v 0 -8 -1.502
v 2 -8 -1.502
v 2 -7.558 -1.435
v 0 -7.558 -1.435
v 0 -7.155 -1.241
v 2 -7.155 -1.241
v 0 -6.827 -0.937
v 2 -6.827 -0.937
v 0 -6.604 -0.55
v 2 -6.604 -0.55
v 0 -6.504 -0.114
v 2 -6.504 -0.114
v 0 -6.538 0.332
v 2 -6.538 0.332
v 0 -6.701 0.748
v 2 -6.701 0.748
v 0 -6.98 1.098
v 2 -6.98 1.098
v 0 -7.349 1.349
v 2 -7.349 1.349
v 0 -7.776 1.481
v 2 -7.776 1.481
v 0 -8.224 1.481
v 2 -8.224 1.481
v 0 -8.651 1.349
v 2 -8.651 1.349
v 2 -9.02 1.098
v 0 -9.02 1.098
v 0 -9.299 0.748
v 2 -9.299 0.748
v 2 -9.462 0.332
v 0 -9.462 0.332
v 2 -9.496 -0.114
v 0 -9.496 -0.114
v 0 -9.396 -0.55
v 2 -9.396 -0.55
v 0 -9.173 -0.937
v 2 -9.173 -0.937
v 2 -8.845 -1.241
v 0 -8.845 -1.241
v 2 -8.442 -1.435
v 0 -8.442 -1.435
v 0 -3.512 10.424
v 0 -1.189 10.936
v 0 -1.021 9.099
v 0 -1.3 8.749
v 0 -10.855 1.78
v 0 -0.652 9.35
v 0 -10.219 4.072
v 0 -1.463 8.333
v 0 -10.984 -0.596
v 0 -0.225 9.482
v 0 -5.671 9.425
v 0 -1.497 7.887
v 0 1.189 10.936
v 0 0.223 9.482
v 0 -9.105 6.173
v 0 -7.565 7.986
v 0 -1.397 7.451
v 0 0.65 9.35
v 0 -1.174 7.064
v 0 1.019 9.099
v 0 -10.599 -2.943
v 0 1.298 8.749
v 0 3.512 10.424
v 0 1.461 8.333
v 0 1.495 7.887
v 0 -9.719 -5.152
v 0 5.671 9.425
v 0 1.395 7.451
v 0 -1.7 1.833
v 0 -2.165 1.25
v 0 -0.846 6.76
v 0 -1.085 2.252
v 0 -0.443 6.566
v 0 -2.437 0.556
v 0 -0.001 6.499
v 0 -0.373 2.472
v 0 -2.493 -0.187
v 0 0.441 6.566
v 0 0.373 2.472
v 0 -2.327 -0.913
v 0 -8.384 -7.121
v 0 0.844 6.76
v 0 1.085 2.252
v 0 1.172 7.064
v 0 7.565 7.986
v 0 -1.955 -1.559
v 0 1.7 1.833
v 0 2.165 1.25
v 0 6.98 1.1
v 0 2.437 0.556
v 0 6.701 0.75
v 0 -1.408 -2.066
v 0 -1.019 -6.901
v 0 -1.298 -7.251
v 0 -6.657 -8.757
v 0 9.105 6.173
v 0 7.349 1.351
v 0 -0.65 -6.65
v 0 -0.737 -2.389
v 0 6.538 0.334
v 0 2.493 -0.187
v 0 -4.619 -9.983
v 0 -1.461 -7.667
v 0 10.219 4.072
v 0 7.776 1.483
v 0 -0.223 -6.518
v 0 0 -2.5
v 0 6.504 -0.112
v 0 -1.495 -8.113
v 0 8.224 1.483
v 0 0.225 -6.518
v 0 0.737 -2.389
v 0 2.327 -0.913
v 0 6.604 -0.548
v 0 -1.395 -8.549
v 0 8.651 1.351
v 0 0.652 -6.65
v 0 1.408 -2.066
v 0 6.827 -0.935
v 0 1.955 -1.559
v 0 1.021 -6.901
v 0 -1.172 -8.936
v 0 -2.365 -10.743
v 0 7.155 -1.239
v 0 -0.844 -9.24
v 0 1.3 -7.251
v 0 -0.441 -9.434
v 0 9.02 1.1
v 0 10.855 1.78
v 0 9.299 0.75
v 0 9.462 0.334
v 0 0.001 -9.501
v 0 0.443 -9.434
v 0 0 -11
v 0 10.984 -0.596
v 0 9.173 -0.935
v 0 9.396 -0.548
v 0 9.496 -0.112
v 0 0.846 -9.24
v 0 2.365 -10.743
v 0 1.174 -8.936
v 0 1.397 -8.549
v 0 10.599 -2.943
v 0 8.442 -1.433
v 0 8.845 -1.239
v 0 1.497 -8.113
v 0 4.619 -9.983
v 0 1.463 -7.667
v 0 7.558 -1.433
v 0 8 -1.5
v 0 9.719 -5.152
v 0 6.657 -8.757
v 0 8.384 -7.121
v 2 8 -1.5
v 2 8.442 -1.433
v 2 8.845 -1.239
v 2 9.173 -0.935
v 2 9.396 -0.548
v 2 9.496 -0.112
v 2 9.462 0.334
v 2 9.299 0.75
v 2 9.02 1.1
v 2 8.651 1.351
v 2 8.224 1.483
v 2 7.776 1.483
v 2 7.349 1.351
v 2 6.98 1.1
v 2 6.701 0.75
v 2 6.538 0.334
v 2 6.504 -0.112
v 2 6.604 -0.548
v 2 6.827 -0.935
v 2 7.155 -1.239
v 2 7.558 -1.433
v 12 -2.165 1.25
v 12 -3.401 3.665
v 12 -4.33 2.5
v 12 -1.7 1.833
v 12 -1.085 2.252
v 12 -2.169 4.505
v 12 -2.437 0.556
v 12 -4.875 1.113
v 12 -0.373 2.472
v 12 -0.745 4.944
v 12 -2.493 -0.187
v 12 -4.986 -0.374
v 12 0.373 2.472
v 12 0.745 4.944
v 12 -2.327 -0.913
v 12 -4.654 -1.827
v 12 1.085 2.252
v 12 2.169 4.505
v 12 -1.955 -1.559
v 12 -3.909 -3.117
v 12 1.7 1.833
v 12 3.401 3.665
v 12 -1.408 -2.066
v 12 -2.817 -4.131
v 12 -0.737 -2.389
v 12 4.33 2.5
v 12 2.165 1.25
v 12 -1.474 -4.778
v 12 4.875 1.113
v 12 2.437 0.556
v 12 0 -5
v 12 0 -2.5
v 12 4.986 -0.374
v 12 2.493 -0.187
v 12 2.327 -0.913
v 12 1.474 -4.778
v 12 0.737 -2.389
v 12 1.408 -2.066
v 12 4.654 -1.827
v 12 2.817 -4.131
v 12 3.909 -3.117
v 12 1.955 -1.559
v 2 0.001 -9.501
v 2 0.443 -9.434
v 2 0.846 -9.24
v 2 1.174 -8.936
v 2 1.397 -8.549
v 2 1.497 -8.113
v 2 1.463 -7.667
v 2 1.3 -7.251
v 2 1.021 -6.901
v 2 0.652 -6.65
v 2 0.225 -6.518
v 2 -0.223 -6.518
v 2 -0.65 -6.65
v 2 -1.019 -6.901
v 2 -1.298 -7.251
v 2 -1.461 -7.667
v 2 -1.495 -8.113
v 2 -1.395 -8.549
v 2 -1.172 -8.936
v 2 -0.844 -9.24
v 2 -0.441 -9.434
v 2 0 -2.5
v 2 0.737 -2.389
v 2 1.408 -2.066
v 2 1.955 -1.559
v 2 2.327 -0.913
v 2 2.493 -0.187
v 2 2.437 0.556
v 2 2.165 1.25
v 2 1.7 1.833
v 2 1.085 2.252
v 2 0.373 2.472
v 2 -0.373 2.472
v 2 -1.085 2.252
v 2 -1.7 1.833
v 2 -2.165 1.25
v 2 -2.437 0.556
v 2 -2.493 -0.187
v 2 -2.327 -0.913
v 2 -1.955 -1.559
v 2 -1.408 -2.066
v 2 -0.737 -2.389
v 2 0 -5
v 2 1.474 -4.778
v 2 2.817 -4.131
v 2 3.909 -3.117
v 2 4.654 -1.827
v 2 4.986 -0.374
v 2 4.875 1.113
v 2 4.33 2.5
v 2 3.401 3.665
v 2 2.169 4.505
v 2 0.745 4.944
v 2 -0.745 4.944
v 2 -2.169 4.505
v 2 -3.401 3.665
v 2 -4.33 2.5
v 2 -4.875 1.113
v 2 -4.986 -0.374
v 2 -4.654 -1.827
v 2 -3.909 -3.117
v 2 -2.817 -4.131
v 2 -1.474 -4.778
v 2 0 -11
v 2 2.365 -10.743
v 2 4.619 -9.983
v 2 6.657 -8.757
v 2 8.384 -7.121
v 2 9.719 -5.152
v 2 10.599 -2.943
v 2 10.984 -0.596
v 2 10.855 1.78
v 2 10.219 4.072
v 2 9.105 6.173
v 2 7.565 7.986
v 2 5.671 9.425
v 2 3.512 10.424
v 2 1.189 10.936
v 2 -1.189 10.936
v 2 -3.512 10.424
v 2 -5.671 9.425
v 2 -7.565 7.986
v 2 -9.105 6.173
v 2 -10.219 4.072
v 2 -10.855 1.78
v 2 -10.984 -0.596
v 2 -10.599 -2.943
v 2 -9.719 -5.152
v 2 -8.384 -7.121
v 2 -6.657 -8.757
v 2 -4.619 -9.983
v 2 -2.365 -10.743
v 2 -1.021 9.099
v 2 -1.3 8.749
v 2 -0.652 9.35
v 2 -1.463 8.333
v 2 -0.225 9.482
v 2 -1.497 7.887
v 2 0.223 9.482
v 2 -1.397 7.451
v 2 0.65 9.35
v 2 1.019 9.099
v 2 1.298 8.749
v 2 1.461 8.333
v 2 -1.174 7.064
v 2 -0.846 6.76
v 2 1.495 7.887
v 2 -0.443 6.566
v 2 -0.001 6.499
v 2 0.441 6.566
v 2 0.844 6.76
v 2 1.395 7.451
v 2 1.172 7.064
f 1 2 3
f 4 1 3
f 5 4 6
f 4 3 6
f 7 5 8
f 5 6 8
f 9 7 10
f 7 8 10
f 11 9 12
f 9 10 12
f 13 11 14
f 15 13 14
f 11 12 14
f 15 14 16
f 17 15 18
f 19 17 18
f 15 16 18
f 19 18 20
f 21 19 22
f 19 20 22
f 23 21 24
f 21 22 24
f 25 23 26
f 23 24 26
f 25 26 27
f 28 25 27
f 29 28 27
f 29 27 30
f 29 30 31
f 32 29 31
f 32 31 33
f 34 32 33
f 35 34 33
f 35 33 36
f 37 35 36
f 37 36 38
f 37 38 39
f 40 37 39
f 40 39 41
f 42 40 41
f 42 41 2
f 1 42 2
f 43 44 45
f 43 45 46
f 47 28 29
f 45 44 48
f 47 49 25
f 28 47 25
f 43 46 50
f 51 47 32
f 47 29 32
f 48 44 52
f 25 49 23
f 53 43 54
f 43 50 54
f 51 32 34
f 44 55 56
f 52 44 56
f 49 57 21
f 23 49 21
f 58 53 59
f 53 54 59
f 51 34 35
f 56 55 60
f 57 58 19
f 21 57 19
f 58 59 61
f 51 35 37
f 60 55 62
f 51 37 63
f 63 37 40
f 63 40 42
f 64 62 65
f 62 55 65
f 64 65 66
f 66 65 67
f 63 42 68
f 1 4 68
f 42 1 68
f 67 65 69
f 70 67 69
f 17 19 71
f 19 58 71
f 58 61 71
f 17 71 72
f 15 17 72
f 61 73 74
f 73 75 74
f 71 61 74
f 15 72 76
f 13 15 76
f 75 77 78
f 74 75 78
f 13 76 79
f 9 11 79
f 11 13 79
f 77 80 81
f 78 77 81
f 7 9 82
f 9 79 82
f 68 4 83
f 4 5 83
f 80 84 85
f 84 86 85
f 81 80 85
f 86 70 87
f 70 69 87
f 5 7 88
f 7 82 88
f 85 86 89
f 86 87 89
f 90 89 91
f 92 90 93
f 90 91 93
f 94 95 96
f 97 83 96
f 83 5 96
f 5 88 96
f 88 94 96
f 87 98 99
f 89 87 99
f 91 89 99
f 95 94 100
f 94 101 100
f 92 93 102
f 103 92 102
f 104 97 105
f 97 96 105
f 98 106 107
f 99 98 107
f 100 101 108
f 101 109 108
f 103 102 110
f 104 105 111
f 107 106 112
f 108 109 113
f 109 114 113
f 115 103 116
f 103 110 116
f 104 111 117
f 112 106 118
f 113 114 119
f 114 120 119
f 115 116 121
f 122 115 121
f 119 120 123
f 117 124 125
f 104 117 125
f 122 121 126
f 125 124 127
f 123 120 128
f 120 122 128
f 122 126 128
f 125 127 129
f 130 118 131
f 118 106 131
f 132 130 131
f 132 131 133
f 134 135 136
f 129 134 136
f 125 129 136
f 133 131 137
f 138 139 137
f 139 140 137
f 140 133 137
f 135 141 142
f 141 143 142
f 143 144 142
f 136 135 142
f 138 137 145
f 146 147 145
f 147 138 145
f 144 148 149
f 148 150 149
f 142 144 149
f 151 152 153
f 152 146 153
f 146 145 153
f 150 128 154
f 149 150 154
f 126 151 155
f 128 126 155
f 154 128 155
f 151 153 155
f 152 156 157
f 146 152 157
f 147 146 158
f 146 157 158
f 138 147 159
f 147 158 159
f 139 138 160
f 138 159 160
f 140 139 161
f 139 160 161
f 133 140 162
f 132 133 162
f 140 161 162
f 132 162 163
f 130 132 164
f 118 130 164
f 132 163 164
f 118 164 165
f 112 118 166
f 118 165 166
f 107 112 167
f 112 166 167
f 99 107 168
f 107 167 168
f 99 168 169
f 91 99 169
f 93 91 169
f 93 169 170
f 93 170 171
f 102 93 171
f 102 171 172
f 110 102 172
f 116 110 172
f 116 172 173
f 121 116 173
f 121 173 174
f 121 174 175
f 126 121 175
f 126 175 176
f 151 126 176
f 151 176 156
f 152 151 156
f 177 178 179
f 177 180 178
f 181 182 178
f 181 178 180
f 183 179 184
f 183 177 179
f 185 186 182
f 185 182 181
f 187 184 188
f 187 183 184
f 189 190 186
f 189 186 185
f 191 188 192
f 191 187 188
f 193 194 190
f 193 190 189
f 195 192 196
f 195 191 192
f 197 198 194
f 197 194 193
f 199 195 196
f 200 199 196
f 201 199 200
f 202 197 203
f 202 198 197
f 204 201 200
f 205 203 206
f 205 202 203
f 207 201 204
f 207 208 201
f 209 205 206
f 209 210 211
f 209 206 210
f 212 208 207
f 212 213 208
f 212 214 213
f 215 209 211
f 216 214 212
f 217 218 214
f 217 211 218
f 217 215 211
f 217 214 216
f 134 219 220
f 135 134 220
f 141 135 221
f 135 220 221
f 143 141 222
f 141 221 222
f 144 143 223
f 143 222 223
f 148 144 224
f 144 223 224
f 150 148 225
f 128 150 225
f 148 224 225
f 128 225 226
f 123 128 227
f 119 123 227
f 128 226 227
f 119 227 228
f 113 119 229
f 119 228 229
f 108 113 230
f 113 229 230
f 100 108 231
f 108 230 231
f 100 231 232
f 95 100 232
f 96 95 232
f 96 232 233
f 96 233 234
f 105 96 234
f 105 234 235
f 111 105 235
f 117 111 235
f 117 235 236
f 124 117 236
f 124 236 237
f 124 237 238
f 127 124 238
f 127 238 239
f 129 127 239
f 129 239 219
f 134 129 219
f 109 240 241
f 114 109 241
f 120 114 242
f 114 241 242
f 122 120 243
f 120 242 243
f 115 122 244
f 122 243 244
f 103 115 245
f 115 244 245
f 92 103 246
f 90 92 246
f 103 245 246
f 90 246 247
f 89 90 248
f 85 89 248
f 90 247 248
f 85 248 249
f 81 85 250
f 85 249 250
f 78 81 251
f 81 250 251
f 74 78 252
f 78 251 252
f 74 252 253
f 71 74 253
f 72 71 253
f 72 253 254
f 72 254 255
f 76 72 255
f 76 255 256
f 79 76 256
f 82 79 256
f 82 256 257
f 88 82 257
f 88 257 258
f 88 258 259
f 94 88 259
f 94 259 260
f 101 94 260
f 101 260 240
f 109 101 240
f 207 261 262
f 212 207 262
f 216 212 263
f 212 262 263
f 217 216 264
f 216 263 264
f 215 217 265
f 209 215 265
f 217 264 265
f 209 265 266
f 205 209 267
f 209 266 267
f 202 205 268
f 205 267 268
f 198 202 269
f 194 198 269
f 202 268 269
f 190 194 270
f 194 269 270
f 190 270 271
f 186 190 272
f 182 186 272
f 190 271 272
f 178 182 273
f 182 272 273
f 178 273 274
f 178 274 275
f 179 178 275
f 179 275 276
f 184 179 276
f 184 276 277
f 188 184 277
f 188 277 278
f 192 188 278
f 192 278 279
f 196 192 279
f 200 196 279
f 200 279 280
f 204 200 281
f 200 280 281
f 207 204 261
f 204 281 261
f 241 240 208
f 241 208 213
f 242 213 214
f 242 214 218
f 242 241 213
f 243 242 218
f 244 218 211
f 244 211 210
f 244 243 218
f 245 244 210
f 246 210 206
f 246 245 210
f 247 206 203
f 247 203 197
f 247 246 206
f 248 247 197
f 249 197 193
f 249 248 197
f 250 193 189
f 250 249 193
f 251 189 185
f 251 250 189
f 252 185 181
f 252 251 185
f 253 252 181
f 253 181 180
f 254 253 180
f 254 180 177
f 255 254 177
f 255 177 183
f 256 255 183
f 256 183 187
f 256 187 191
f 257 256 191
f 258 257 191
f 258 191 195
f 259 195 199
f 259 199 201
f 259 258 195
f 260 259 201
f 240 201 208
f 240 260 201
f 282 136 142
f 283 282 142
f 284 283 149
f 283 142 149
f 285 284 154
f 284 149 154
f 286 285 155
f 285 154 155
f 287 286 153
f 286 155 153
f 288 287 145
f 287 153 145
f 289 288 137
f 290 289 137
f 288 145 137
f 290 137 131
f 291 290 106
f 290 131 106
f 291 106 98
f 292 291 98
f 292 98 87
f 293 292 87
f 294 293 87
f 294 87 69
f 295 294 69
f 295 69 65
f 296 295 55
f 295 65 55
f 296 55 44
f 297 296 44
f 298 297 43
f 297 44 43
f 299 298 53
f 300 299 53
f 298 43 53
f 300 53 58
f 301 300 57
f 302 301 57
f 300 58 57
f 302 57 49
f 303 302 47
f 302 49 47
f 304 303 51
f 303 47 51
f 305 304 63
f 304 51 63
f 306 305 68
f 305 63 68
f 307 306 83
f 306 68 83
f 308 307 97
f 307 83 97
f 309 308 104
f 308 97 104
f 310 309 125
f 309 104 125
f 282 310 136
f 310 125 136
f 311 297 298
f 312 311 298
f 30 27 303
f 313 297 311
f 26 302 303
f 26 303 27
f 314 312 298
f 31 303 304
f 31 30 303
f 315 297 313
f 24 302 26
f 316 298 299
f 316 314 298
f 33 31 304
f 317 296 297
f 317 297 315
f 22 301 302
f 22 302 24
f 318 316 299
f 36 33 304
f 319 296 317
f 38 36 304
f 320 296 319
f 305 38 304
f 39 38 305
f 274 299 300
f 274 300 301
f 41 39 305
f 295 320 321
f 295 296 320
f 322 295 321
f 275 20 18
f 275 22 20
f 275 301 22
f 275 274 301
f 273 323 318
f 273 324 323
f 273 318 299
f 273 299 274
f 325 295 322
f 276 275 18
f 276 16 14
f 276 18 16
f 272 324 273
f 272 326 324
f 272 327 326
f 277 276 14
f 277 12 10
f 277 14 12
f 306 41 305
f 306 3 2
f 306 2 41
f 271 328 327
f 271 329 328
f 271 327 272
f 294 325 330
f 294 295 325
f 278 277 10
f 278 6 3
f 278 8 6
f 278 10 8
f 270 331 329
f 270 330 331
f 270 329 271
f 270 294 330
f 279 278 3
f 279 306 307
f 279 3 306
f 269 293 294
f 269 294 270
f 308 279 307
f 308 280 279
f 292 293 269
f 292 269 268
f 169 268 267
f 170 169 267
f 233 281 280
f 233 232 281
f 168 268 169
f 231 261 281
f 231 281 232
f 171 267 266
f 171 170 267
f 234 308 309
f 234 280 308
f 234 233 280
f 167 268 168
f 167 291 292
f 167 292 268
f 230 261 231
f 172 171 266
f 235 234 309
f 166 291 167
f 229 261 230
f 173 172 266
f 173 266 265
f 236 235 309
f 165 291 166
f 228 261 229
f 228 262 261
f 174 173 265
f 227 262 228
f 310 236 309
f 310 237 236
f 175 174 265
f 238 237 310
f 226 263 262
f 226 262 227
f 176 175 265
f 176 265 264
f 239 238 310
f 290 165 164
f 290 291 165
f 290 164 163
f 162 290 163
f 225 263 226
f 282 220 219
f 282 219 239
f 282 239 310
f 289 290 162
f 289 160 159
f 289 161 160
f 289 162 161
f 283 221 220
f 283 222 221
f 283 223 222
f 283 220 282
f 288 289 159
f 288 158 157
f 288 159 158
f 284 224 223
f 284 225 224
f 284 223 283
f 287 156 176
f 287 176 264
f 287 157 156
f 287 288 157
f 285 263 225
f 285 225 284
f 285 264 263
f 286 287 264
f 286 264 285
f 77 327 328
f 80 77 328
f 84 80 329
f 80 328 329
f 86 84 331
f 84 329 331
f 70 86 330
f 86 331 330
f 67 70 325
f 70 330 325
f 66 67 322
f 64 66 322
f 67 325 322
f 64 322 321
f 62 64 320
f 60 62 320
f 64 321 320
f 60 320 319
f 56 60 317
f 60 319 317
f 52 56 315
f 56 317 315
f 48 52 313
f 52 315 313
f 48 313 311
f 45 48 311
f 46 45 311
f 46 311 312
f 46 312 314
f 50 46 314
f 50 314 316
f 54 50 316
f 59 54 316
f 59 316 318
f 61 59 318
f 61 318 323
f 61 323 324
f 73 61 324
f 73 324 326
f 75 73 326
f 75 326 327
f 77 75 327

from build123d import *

# Parameters (mm, degrees)
SKETCH_1_R          = 11
EXTRUDE_1_DEPTH     = 2
SKETCH_2_R          = 5
SKETCH_2_R_2        = 2.5
EXTRUDE_2_DEPTH     = 10
SKETCH_3_R          = 1.5
CUT_EXTRUDE_1_DEPTH = 10
SKETCH_5_R          = 2.5
CUT_EXTRUDE_2_DEPTH = 19.493242009


with BuildPart() as part:
    # 草图1 → 凸台-拉伸1 (new body)
    with BuildSketch(Plane(origin=(0, 0, 0), x_dir=(0, 0, -1), z_dir=(1, 0, 0))):
        Circle(SKETCH_1_R)
    extrude(amount=EXTRUDE_1_DEPTH)

    # 草图2 → 凸台-拉伸2 (add)
    with BuildSketch(Plane(origin=(2, 0, 0), x_dir=(0, 0, -1), z_dir=(1, 0, 0))):
        Circle(SKETCH_2_R)
        Circle(SKETCH_2_R_2, mode=Mode.SUBTRACT)
    extrude(amount=EXTRUDE_2_DEPTH)

    # 草图3 → 切除-拉伸1 (cut)
    with BuildSketch(Plane(origin=(2, 0, 0), x_dir=(0, 0, -1), z_dir=(1, 0, 0))):
        with Locations((0, 8)):
            Circle(SKETCH_3_R)
        with Locations((8.001, 0.001)):
            Circle(SKETCH_3_R)
        with Locations((0.002, -8)):
            Circle(SKETCH_3_R)
        with Locations((-7.999, -0.001)):
            Circle(SKETCH_3_R)
    extrude(amount=-CUT_EXTRUDE_1_DEPTH, mode=Mode.SUBTRACT)

    # 草图5 → 切除-拉伸2 (cut, through all)
    with BuildSketch(Plane(origin=(2, 0, 0), x_dir=(0, 0, -1), z_dir=(1, 0, 0))):
        Circle(SKETCH_5_R)
    extrude(amount=-CUT_EXTRUDE_2_DEPTH, mode=Mode.SUBTRACT)


solid = part.part
